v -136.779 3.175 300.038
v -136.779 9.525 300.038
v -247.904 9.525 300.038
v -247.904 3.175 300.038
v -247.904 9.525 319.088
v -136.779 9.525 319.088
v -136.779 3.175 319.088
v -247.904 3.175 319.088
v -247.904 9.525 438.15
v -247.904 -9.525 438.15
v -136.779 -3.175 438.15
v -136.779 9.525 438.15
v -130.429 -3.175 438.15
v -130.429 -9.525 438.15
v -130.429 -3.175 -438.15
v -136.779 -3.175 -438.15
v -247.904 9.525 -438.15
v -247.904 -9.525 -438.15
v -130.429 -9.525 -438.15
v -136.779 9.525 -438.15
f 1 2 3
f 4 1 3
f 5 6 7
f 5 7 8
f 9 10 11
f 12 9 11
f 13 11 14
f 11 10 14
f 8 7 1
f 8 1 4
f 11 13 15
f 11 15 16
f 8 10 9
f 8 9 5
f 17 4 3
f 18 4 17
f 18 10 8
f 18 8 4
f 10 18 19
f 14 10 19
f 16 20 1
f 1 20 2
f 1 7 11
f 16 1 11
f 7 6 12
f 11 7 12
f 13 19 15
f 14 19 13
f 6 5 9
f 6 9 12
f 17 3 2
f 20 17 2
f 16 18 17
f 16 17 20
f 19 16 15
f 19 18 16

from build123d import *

# Parameters (mm, degrees)
F0_W     = 117.475
F0_H     = 438.15
F1_DEPTH = 9.525
F2_W     = 117.475
F2_H     = 19.05
F3_DEPTH = 6.35
F4_W     = 6.35
F4_H     = 138.1125
F4_H_2   = 738.1875
F5_DEPTH = 12.7


with BuildPart() as f1:
    # F0 (on Front) → F1 (new body, symmetric)
    with BuildSketch(Plane.XZ):
        with Locations((-189.1664953259, 219.075)):
            Rectangle(F0_W, F0_H)
        with Locations((-189.1664953259, -219.075)):
            Rectangle(F0_W, F0_H)
    extrude(amount=F1_DEPTH, both=True)

    # F2 (on face) → F3 (cut)
    with BuildSketch(Plane(origin=(0, 9.525, 0), x_dir=(-1, 0, 0), z_dir=(0, 1, 0))):
        with Locations((189.1664953259, 309.5625)):
            Rectangle(F2_W, F2_H)
    extrude(amount=-F3_DEPTH, mode=Mode.SUBTRACT)

    # F4 (on face) → F5 (cut)
    with BuildSketch(Plane(origin=(0, 9.525, 0), x_dir=(-1, 0, 0), z_dir=(0, 1, 0))):
        with Locations((133.6039953259, 369.09375)):
            Rectangle(F4_W, F4_H)
        with Locations((133.6039953259, -69.05625)):
            Rectangle(F4_W, F4_H_2)
    extrude(amount=-F5_DEPTH, mode=Mode.SUBTRACT)


solid = f1.part
